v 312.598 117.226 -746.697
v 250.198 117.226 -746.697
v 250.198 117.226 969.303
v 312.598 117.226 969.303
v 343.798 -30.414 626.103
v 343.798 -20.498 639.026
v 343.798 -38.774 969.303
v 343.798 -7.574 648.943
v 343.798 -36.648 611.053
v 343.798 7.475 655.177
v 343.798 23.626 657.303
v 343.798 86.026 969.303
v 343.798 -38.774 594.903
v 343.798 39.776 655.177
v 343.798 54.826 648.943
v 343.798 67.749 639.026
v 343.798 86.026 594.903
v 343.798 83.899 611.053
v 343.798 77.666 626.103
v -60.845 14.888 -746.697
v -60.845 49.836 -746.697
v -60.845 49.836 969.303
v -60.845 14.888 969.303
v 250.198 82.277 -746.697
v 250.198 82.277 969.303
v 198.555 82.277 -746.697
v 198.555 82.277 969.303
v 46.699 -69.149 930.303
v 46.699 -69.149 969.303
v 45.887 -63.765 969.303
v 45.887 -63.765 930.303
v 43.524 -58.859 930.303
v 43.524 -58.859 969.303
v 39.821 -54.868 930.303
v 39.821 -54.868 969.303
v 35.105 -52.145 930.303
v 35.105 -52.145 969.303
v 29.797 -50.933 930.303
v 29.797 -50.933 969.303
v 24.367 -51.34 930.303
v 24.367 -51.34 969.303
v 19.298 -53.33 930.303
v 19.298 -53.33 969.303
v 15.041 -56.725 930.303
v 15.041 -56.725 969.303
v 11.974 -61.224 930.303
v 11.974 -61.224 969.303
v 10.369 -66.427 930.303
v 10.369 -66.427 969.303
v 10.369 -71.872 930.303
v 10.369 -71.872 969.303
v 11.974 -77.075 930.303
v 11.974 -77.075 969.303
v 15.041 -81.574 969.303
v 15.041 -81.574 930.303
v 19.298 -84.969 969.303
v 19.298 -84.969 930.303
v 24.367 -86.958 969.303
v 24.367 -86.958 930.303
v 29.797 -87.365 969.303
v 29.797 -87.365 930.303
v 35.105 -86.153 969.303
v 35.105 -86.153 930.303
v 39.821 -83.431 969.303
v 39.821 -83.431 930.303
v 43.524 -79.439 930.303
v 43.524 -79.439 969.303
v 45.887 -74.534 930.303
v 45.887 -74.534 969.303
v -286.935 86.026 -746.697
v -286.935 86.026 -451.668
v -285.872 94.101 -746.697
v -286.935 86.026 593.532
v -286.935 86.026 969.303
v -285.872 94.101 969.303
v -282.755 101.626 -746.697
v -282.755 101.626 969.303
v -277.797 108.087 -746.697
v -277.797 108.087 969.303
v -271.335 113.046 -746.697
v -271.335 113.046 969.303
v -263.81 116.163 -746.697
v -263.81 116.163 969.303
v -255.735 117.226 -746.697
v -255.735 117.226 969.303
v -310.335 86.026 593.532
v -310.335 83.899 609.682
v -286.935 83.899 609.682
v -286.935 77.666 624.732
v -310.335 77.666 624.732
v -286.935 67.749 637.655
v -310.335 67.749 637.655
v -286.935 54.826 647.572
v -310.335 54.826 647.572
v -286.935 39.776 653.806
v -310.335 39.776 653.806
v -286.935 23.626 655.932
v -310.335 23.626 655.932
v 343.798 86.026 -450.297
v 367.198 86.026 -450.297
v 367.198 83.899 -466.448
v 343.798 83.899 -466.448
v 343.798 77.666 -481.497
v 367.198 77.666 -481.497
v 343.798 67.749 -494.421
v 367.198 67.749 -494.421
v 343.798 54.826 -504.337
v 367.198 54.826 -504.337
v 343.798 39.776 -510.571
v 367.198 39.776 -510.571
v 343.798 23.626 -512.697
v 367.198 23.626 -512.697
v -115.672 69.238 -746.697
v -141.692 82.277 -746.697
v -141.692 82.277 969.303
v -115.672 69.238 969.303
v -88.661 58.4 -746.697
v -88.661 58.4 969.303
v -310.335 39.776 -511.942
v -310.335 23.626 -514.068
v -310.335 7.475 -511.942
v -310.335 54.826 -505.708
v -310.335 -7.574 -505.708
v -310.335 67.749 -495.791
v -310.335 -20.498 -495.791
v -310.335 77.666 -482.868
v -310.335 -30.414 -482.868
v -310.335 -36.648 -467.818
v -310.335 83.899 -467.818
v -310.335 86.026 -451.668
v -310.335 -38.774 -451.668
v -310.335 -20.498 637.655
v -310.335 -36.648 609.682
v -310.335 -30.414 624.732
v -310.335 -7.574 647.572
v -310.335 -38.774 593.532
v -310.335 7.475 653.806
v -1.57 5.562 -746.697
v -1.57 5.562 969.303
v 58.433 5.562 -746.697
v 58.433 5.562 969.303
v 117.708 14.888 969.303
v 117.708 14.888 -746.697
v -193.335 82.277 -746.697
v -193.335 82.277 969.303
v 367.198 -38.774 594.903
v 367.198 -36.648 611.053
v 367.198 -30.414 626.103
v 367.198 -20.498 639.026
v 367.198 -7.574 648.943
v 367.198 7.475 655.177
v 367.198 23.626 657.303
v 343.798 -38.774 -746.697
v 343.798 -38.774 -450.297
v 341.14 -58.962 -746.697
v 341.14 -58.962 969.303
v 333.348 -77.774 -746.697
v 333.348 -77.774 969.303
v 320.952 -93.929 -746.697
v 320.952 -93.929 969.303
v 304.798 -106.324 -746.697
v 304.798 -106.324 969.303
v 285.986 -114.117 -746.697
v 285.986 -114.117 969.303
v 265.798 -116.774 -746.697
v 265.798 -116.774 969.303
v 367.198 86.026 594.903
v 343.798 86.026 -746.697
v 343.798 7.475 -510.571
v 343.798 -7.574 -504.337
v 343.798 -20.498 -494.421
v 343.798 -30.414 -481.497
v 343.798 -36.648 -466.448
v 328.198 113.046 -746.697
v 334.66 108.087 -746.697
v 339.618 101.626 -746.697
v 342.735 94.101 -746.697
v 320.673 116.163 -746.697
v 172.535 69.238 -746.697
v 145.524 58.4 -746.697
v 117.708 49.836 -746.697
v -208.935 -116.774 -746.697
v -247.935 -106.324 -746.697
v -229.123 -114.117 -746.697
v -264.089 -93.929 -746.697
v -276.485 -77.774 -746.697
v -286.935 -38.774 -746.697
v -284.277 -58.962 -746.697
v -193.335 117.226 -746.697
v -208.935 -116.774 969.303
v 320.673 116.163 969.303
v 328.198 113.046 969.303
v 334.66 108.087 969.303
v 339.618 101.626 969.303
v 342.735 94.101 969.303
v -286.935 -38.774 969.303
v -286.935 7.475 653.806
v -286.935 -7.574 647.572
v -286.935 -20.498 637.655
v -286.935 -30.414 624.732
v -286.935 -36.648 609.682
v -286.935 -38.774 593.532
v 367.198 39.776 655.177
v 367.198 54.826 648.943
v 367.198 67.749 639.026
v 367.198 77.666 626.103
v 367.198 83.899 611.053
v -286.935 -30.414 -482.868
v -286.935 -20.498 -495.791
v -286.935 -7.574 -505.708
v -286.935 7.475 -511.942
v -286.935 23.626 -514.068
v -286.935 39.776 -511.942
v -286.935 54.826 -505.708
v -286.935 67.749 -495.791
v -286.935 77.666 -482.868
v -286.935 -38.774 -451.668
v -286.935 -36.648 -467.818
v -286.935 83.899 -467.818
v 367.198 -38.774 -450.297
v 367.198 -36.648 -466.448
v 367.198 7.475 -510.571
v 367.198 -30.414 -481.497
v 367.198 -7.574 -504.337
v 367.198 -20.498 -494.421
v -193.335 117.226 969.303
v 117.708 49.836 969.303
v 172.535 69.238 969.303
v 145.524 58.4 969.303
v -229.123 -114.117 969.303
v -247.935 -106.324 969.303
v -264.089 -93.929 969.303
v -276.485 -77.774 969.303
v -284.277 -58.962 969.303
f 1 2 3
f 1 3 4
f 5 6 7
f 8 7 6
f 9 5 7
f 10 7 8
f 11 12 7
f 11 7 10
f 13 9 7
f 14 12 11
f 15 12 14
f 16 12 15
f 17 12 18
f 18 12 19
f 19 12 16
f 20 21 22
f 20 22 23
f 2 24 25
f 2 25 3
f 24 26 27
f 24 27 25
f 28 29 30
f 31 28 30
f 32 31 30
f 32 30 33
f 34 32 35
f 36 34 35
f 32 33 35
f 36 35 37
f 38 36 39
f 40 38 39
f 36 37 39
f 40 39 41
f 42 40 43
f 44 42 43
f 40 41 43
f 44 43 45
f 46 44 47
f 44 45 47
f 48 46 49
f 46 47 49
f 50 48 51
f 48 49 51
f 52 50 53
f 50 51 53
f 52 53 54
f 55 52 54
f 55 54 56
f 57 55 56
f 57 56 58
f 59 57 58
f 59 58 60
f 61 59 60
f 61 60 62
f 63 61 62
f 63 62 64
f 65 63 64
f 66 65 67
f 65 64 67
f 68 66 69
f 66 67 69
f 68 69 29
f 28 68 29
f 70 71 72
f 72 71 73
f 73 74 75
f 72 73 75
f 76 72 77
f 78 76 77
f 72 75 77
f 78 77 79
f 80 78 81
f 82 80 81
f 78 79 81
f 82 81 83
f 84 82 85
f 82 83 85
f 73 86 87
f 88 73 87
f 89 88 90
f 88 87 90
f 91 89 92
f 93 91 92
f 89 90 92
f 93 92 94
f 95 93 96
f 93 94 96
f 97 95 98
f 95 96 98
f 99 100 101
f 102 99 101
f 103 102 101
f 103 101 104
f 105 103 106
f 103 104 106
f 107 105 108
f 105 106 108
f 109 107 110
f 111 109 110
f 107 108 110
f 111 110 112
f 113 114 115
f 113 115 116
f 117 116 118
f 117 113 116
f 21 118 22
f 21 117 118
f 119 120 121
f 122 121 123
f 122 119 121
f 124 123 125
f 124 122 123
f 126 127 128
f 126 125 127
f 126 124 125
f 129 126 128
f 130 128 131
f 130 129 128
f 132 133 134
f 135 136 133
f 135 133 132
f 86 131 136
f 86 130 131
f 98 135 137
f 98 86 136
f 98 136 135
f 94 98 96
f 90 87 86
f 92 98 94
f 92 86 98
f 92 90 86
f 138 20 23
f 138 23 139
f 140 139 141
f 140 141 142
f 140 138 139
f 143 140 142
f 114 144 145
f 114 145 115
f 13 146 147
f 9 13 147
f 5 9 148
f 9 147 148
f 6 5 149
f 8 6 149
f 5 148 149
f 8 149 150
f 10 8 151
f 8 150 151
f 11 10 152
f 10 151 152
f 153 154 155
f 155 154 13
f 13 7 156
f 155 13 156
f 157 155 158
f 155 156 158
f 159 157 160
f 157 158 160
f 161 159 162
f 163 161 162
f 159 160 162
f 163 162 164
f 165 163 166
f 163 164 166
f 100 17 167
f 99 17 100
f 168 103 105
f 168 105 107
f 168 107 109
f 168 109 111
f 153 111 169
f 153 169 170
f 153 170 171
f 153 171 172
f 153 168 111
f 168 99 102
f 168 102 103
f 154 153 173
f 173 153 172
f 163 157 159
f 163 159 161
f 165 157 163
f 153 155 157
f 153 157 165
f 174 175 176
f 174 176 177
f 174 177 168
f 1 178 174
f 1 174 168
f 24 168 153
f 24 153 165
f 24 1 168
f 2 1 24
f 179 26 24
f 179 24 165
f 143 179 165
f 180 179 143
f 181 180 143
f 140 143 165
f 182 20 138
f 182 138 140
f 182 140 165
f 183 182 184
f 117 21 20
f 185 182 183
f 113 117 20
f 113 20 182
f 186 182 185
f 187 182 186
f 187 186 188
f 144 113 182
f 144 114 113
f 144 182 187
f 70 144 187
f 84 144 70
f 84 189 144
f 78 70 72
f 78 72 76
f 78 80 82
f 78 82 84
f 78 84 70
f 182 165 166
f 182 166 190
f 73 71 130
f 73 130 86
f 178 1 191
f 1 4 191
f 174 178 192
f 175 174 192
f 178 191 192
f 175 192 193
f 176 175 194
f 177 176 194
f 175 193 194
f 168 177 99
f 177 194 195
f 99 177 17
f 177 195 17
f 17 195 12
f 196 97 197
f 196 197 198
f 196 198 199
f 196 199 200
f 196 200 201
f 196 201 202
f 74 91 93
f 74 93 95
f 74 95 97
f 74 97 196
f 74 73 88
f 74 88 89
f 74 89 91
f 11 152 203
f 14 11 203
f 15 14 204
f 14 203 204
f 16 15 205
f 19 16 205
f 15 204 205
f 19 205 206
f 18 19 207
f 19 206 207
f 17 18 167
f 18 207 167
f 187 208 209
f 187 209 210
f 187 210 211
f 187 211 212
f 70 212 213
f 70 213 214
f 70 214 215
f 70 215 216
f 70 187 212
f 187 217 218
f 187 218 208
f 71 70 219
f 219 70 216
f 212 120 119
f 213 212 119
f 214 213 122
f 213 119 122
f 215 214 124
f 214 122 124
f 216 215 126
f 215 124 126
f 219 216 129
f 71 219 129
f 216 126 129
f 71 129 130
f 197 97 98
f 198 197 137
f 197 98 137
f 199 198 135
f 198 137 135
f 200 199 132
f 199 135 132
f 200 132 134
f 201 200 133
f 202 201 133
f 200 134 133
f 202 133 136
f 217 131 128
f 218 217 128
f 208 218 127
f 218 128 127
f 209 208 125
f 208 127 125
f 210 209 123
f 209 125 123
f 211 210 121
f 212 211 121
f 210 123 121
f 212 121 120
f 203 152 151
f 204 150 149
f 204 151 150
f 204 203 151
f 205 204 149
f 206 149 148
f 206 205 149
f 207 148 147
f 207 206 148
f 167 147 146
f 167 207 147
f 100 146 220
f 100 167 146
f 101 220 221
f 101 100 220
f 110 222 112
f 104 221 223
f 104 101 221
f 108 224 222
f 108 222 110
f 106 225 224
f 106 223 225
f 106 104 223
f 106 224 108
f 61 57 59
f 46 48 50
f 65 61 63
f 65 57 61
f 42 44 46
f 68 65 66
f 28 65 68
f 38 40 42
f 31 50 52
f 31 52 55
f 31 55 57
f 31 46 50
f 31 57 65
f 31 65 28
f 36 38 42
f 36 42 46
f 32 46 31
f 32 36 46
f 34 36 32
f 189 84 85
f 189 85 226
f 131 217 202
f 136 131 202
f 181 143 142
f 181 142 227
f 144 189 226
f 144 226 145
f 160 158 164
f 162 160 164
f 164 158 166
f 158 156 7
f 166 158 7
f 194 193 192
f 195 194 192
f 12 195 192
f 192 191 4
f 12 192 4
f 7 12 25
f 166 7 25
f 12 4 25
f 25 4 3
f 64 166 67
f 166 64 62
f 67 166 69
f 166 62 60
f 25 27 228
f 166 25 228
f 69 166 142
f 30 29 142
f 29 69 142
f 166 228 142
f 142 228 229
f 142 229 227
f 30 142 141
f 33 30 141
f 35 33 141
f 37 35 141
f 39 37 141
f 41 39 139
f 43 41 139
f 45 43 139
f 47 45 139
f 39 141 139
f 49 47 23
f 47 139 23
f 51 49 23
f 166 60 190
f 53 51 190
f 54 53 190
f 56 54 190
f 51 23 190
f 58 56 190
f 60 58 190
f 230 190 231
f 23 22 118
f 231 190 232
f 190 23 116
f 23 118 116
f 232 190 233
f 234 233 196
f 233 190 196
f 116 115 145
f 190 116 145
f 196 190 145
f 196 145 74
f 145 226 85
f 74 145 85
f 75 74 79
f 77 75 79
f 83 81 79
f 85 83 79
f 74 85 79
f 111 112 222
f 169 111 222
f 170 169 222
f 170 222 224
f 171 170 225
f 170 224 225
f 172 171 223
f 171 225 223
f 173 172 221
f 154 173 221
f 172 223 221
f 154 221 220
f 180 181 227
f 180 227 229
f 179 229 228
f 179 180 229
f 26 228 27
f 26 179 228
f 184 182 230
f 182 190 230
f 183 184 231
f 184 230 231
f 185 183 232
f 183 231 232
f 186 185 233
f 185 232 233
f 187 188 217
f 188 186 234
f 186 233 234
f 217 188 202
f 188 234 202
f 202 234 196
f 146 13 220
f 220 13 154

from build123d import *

# Parameters (mm, degrees)
BOSS_EXTRUDE1_DEPTH = 220
FILLET1_R           = 4
FILLET2_R           = 10
SKETCH6_W           = 150
SKETCH6_H           = 16
BOSS_EXTRUDE2_DEPTH = 3
SKETCH7_W           = 150
SKETCH7_H           = 16
BOSS_EXTRUDE3_DEPTH = 3
CUT_EXTRUDE1_DEPTH  = 3
CUT_EXTRUDE2_DEPTH  = 3
SKETCH10_R          = 2.341915658
CUT_EXTRUDE3_DEPTH  = 5
SCALE1_SCALE        = 15.6
SCALE2_SCALE        = 0.5


with BuildPart() as part:
    # Sketch1 → Boss-Extrude1 (new body)
    with BuildSketch(Plane.XY):
        with BuildLine():
            ThreePointArc((39.877280439, -8.639636697), (45.189316192, -6.882935474), (50.242300545, -4.480629882))
            Line((50.242300545, -4.480629882), (56.863188539, -4.480629882))
            Line((56.863188539, -4.480629882), (56.863188539, 0))
            Line((56.863188539, 0), (68.863188539, 0))
            Line((68.863188539, 0), (68.863188539, -30))
            Line((68.863188539, -30), (-12, -30))
            Line((-12, -30), (-12, 0))
            Line((-12, 0), (0, 0))
            Line((0, 0), (0, -4.480629882))
            Line((0, -4.480629882), (6.620887994, -4.480629882))
            ThreePointArc((6.620887994, -4.480629882), (11.673872347, -6.882935474), (16.9859081, -8.639636697))
            Line((16.9859081, -8.639636697), (16.9859081, -13.120266579))
            ThreePointArc((16.9859081, -13.120266579), (28.43159427, -14.466004542), (39.877280439, -13.120266579))
            Line((39.877280439, -13.120266579), (39.877280439, -8.639636697))
        make_face()
    extrude(amount=BOSS_EXTRUDE1_DEPTH)

    # Fillet1
    fillet1_edges = [part.edges().sort_by_distance(p)[0] for p in [
        (68.863188539, 0, 110),
        (-12, 0, 110),
    ]]
    fillet(fillet1_edges, radius=FILLET1_R)

    # Fillet2
    fillet2_edges = [part.edges().sort_by_distance(p)[0] for p in [
        (68.863188539, -30, 110),
        (-12, -30, 110),
    ]]
    fillet(fillet2_edges, radius=FILLET2_R)

    # Sketch6 → Boss-Extrude2 (add)
    with BuildSketch(Plane(origin=(68.863188539, 0, 0), x_dir=(0, 0, -1), z_dir=(1, 0, 0))):
        with Locations((-105, -12)):
            Rectangle(SKETCH6_W, SKETCH6_H)
    extrude(amount=BOSS_EXTRUDE2_DEPTH)

    # Sketch7 → Boss-Extrude3 (add)
    with BuildSketch(Plane.ZY.offset(12)):
        with Locations((104.824258167, -12)):
            Rectangle(SKETCH7_W, SKETCH7_H)
    extrude(amount=BOSS_EXTRUDE3_DEPTH)

    # Sketch8 → Cut-Extrude1 (cut)
    with BuildSketch(Plane.ZY.offset(15)):
        with BuildLine():
            ThreePointArc((37.824258167, -20), (32.167403918, -17.656854249), (29.824258167, -12))
            Line((29.824258167, -12), (29.824258167, -20))
            Line((29.824258167, -20), (37.824258167, -20))
        make_face()
        with BuildLine():
            ThreePointArc((29.824258167, -12), (32.167403918, -6.343145751), (37.824258167, -4))
            Line((37.824258167, -4), (29.824258167, -4))
            Line((29.824258167, -4), (29.824258167, -12))
        make_face()
        with BuildLine():
            Line((179.824258167, -20), (179.824258167, -12))
            ThreePointArc((179.824258167, -12), (177.481112417, -17.656854249), (171.824258167, -20))
            Line((171.824258167, -20), (179.824258167, -20))
        make_face()
        with BuildLine():
            Line((179.824258167, -4), (171.824258167, -4))
            ThreePointArc((171.824258167, -4), (177.481112417, -6.343145751), (179.824258167, -12))
            Line((179.824258167, -12), (179.824258167, -4))
        make_face()
    extrude(amount=-CUT_EXTRUDE1_DEPTH, mode=Mode.SUBTRACT)

    # Sketch9 → Cut-Extrude2 (cut)
    with BuildSketch(Plane(origin=(71.863188539, 0, 0), x_dir=(0, 0, -1), z_dir=(1, 0, 0))):
        with BuildLine():
            ThreePointArc((-180, -12), (-177.656854249, -6.343145751), (-172, -4))
            Line((-172, -4), (-180, -4))
            Line((-180, -4), (-180, -12))
        make_face()
        with BuildLine():
            ThreePointArc((-172, -20), (-177.656854249, -17.656854249), (-180, -12))
            Line((-180, -12), (-180, -20))
            Line((-180, -20), (-172, -20))
        make_face()
        with BuildLine():
            Line((-30, -4), (-38, -4))
            ThreePointArc((-38, -4), (-32.343145751, -6.343145751), (-30, -12))
            Line((-30, -12), (-30, -4))
        make_face()
        with BuildLine():
            Line((-30, -20), (-30, -12))
            ThreePointArc((-30, -12), (-32.343145751, -17.656854249), (-38, -20))
            Line((-38, -20), (-30, -20))
        make_face()
    extrude(amount=-CUT_EXTRUDE2_DEPTH, mode=Mode.SUBTRACT)

    # Sketch10 → Cut-Extrude3 (cut)
    with BuildSketch(Plane.XY.offset(220)):
        with Locations((28.43159427, -23.894216735)):
            Circle(SKETCH10_R)
    extrude(amount=-CUT_EXTRUDE3_DEPTH, mode=Mode.SUBTRACT)


with BuildPart() as part_1:
    # Scale1: scaled about (28.43159427, -17.23906253, 109.80841841)
    add(part.part.scale(SCALE1_SCALE).moved(Location((-415.101276342, 251.690312938, -1603.202908786))))


with BuildPart() as part_2:
    # Scale2: scaled about (28.431594264, -17.23906253, 109.808418405)
    add(part_1.part.scale(SCALE2_SCALE).moved(Location((14.215797132, -8.619531265, 54.904209202))))


solid = part_2.part
